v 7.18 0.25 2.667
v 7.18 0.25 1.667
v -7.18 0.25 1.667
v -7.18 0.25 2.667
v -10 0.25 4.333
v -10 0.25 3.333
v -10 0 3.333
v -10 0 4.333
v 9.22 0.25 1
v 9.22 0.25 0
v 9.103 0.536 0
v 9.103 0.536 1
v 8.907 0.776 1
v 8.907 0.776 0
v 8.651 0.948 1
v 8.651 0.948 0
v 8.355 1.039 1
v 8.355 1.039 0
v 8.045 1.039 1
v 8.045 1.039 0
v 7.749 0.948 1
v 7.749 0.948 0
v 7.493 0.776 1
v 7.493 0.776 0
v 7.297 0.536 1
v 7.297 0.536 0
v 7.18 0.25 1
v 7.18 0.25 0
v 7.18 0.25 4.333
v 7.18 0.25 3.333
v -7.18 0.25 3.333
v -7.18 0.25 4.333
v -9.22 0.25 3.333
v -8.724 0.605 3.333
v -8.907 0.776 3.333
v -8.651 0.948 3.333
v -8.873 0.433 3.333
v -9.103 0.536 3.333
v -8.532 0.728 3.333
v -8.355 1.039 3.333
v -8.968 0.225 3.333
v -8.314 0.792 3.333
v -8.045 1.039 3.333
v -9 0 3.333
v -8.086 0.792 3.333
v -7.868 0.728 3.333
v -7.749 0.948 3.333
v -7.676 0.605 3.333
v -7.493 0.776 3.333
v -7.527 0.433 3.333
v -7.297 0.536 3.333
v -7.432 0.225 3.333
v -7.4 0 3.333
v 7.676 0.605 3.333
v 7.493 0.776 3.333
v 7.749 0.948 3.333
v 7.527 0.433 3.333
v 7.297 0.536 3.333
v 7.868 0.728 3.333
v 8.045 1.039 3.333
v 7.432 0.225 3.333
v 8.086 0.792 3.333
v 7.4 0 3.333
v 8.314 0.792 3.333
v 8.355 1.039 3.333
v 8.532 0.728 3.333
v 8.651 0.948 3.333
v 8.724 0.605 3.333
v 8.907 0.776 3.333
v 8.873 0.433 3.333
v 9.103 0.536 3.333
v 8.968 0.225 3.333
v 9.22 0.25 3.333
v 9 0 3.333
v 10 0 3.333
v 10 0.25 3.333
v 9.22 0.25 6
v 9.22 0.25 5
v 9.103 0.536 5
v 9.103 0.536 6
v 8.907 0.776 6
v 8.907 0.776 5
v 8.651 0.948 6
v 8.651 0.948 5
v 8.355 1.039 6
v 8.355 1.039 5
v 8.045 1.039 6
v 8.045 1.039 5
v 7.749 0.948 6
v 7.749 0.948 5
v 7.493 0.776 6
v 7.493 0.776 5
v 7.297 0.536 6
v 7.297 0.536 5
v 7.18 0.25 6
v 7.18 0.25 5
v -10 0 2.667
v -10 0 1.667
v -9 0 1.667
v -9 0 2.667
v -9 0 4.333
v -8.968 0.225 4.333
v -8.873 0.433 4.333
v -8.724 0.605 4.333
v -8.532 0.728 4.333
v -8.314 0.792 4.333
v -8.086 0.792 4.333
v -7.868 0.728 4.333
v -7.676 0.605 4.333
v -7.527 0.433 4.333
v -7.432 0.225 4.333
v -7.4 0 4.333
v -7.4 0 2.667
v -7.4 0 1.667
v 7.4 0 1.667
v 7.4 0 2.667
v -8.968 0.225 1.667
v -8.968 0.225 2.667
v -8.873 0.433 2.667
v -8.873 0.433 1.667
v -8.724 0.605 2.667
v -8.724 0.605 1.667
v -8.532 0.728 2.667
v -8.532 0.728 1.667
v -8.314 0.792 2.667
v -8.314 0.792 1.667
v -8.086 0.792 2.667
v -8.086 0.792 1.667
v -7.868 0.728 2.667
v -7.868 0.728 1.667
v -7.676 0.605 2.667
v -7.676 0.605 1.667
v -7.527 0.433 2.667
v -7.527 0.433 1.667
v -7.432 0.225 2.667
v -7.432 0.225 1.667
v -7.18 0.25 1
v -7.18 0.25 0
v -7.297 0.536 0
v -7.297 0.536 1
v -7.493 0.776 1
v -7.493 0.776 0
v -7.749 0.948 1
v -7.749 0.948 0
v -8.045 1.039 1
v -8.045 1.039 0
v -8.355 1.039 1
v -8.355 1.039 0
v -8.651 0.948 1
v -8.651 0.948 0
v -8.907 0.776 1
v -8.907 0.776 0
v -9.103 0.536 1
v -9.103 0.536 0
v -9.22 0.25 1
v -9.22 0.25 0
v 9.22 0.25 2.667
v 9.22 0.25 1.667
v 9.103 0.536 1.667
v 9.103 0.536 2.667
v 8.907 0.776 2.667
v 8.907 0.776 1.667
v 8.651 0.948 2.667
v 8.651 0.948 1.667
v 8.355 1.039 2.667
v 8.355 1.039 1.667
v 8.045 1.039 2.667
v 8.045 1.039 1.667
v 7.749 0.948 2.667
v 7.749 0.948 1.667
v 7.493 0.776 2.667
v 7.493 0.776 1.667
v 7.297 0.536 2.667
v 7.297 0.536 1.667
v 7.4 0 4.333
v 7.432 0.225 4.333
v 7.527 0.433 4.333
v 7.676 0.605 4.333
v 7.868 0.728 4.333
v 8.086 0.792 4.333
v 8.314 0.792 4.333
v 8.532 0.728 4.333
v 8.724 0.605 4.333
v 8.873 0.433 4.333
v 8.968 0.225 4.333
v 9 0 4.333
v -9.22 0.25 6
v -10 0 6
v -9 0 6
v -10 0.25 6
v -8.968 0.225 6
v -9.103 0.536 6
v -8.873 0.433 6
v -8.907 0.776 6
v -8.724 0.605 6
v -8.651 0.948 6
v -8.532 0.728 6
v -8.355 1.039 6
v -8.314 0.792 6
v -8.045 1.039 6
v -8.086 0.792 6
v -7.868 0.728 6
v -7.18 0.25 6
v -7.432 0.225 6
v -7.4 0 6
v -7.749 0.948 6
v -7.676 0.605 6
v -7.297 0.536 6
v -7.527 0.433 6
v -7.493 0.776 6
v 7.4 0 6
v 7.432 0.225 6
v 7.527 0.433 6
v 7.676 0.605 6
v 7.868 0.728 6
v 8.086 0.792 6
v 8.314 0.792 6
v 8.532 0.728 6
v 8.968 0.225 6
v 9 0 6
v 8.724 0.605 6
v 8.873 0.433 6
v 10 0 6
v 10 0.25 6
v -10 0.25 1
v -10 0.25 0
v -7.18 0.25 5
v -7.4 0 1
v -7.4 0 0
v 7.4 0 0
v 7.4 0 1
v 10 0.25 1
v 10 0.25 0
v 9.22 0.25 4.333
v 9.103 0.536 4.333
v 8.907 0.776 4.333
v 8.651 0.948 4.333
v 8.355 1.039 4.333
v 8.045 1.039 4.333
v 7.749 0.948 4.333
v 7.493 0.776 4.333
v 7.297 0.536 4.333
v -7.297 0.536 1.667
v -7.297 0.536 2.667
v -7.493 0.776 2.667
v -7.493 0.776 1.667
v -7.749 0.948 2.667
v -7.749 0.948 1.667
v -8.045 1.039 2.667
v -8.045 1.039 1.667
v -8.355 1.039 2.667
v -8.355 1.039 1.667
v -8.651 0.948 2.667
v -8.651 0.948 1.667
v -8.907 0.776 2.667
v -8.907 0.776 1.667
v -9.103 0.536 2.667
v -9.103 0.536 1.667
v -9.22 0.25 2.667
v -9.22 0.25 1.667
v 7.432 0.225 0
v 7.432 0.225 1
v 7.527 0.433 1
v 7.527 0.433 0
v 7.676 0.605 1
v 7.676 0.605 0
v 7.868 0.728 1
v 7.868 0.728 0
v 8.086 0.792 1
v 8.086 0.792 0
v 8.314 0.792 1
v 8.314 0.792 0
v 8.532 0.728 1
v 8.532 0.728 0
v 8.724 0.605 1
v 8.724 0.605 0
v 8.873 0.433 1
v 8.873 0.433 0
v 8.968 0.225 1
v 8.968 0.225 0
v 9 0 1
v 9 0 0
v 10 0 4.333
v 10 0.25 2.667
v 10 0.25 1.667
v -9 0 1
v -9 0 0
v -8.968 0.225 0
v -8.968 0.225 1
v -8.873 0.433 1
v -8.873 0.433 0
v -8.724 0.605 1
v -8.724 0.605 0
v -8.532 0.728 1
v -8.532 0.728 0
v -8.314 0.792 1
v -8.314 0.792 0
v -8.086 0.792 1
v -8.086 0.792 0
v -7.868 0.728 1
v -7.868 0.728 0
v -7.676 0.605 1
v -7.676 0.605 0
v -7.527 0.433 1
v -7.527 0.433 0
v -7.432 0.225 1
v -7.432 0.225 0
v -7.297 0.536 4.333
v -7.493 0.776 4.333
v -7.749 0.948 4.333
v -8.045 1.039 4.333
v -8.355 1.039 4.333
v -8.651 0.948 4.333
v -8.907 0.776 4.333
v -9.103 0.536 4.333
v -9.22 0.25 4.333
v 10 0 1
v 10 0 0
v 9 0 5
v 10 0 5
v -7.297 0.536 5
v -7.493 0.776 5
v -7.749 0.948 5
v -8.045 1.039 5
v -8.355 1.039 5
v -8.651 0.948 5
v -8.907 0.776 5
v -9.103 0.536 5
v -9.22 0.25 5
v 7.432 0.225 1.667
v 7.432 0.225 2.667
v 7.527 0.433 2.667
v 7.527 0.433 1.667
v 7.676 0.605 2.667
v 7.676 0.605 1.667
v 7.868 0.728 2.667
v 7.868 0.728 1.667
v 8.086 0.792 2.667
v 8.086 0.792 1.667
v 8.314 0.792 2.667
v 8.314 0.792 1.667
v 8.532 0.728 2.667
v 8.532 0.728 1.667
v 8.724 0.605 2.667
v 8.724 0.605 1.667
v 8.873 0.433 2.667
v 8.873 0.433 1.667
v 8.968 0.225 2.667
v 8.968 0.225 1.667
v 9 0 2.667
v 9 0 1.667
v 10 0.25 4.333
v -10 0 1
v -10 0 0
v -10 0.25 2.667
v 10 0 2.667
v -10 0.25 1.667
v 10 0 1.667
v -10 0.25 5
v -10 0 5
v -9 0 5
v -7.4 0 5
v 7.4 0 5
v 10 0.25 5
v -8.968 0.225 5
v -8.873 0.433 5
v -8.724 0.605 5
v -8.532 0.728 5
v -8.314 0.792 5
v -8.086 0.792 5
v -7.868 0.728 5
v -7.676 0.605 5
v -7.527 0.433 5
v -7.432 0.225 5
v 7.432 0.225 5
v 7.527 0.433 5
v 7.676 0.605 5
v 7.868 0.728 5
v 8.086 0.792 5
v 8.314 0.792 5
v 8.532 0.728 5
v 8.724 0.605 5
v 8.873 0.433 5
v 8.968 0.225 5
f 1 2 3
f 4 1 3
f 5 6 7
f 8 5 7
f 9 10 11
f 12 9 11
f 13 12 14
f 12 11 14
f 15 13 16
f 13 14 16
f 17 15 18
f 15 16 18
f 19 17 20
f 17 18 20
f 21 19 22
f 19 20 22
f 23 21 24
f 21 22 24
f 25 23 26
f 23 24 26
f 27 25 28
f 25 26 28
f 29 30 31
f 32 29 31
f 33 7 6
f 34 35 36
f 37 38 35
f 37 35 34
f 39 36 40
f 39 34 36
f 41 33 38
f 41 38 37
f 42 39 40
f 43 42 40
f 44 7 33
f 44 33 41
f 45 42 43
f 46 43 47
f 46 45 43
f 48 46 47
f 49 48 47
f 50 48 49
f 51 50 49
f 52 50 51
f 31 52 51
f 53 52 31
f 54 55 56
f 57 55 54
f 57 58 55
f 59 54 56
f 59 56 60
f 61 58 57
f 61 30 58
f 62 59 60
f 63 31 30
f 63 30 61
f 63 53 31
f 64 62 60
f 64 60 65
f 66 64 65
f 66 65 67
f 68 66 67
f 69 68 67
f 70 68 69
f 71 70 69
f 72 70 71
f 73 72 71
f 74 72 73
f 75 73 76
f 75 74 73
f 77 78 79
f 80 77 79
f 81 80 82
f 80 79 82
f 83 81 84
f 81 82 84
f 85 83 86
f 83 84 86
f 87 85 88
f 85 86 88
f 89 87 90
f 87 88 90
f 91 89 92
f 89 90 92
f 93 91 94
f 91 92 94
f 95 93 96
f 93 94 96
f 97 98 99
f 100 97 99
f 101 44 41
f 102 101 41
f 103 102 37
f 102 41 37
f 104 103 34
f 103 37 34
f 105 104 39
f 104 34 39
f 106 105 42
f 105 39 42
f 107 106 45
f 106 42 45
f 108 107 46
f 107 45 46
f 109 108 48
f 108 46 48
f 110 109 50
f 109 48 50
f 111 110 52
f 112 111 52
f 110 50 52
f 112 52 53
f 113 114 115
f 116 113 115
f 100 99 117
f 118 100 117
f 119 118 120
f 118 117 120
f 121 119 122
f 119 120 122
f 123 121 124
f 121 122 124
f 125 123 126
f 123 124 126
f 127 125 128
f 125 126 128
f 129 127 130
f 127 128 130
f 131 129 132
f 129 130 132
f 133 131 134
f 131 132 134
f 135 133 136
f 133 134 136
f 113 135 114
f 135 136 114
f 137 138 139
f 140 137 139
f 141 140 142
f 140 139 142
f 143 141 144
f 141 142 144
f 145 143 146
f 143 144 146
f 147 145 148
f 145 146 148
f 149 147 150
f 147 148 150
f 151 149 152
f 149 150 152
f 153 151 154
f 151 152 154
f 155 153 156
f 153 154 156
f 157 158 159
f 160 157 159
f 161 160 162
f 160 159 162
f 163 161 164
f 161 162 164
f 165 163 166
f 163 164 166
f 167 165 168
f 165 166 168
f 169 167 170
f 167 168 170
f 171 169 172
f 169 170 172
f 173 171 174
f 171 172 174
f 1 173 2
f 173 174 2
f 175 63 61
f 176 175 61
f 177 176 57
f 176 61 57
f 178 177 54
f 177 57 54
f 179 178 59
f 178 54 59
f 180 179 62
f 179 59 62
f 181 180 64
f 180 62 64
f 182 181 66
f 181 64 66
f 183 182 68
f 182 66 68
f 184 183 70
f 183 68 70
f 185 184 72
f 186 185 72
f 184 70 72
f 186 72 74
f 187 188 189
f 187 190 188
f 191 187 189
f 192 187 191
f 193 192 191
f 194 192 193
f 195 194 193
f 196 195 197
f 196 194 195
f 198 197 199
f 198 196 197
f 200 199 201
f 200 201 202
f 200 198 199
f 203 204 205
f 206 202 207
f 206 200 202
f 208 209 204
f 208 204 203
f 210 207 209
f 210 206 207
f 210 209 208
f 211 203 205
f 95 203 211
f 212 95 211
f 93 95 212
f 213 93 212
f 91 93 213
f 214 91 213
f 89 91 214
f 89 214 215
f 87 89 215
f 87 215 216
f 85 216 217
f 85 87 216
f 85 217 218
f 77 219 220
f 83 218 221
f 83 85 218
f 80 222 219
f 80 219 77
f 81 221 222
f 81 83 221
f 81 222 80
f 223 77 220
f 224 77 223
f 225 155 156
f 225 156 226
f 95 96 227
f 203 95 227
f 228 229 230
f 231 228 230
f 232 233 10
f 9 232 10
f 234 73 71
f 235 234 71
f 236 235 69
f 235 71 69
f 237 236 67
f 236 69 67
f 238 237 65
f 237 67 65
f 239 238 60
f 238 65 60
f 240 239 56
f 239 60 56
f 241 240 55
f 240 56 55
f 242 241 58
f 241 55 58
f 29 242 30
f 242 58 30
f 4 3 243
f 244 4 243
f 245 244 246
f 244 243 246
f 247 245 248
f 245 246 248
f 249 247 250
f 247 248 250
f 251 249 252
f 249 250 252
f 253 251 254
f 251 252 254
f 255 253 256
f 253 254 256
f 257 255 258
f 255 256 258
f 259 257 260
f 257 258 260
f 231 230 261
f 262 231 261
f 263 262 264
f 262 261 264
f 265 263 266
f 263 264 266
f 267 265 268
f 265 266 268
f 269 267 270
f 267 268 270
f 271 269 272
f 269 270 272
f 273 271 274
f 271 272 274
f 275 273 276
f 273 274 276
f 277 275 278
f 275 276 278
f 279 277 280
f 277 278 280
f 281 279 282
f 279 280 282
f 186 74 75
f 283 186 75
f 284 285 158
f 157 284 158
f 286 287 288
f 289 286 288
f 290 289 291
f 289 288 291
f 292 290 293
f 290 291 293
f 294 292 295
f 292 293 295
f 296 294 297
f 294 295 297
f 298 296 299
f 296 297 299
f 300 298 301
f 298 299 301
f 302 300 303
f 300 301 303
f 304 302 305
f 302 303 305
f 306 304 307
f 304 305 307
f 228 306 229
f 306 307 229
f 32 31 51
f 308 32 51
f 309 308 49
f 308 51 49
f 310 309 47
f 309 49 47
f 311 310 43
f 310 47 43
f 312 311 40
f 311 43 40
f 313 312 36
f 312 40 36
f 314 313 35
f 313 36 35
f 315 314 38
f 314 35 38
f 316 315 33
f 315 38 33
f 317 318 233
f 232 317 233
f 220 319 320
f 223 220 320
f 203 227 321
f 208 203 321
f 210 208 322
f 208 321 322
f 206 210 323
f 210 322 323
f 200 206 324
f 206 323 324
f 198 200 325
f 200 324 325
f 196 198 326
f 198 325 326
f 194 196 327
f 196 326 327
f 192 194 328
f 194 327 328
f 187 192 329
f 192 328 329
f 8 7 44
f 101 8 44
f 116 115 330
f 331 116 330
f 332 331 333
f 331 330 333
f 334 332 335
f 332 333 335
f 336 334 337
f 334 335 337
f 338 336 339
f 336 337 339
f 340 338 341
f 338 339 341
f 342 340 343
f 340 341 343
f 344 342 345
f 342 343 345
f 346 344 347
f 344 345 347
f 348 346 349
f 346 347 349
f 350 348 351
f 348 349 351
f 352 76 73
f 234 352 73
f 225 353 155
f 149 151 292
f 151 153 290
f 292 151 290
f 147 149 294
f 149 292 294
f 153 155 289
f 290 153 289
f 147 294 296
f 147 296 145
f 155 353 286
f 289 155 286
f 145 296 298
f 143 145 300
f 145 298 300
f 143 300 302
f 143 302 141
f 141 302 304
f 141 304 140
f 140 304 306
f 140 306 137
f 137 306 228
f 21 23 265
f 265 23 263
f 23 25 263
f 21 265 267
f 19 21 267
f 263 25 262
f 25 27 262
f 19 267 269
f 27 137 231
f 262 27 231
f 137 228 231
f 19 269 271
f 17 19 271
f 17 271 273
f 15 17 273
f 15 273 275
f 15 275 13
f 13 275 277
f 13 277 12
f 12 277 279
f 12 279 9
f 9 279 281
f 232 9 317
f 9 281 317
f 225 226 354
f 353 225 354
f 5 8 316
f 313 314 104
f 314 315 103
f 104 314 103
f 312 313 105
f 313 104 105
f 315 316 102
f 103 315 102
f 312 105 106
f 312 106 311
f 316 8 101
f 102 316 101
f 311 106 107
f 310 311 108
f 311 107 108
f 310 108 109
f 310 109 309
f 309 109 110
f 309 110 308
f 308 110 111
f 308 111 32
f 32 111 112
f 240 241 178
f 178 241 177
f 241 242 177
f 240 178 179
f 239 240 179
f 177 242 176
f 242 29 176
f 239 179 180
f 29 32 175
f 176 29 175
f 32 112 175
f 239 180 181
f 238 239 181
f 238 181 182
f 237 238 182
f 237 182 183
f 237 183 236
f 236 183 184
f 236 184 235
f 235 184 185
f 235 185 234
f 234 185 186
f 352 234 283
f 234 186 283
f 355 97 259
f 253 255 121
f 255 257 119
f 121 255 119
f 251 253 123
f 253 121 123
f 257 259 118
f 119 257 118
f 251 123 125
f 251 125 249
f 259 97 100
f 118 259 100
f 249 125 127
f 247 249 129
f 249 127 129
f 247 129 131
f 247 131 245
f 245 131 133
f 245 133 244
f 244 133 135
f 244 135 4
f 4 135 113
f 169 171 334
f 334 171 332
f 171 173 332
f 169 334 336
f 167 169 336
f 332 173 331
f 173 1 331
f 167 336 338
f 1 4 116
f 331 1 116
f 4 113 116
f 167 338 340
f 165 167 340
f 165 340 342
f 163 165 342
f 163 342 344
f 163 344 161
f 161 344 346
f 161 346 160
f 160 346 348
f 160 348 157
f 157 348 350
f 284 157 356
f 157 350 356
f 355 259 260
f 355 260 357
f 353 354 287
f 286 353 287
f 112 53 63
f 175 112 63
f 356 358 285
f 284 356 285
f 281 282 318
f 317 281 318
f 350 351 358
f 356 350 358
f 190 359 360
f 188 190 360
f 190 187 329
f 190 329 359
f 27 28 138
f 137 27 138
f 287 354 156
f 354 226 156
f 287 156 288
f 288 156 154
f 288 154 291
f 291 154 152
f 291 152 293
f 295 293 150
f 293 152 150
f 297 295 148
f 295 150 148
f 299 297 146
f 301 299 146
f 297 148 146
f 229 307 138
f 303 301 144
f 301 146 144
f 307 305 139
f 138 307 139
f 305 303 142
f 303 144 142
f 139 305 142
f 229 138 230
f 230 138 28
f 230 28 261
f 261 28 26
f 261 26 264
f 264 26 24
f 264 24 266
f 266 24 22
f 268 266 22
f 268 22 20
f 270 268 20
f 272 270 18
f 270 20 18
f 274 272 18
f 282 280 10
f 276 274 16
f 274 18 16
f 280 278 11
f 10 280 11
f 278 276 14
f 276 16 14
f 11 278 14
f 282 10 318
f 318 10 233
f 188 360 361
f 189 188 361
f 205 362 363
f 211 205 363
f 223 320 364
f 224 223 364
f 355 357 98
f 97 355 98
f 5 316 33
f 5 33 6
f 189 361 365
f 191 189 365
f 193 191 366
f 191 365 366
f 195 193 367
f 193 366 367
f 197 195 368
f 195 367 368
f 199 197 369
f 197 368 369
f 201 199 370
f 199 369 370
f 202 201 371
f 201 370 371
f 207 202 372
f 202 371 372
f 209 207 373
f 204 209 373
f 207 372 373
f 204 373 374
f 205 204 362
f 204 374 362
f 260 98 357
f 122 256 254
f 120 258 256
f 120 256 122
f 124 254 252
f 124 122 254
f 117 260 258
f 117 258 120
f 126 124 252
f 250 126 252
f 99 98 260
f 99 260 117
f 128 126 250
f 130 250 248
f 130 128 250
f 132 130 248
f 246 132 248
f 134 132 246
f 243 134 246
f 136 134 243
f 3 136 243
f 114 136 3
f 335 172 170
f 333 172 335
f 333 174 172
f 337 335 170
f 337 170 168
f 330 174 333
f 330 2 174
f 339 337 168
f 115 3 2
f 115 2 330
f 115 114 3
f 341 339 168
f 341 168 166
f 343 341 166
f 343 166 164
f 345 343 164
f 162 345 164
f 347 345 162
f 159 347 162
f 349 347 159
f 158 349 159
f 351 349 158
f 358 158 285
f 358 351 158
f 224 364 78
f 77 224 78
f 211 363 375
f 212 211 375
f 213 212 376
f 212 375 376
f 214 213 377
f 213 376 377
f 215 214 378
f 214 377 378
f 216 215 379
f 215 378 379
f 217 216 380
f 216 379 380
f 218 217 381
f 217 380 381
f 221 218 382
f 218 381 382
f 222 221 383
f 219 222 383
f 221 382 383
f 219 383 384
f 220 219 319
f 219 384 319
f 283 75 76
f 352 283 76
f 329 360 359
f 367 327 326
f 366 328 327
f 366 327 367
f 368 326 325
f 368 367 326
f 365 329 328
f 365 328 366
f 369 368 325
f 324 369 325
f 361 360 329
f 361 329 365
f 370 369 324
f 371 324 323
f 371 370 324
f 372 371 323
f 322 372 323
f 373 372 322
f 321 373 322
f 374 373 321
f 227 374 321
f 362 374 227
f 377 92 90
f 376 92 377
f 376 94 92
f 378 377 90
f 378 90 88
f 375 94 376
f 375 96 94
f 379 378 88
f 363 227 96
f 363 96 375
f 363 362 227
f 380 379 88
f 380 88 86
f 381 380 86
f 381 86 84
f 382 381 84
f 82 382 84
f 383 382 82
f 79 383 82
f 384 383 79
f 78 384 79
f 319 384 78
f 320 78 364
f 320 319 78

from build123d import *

# Parameters (mm, degrees)
EXTRUDE_THIN1_DEPTH = 6
SKETCH2_W           = 20
SKETCH2_H           = 0.666666
EXTRUDE1_DEPTH      = 2.05


with BuildPart() as part:
    # Sketch1 → Extrude-Thin1 (new body)
    with BuildSketch(Plane.XY):
        with BuildLine():
            Line((-10, 0), (-9, 0))
            ThreePointArc((-9, 0), (-8.2, 0.8), (-7.4, 0))
            Line((-7.4, 0), (7.4, 0))
            ThreePointArc((7.4, 0), (8.2, 0.8), (9, 0))
            Line((9, 0), (10, 0))
            Line((10, 0), (10, 0.25))
            Line((10, 0.25), (9.219803903, 0.25))
            ThreePointArc((9.219803903, 0.25), (8.2, 1.05), (7.180196097, 0.25))
            Line((7.180196097, 0.25), (-7.180196097, 0.25))
            ThreePointArc((-7.180196097, 0.25), (-8.2, 1.05), (-9.219803903, 0.25))
            Line((-9.219803903, 0.25), (-10, 0.25))
            Line((-10, 0.25), (-10, 0))
        make_face()
    extrude(amount=EXTRUDE_THIN1_DEPTH)

    # Sketch2 → Extrude1 (cut, through all)
    with BuildSketch(Plane(origin=(0, 0, 0), x_dir=(1, 0, 0), z_dir=(0, 1, 0))):
        with Locations((0, -1.333333)):
            Rectangle(SKETCH2_W, SKETCH2_H)
        with Locations((0, -2.999999)):
            Rectangle(SKETCH2_W, SKETCH2_H)
        with Locations((0, -4.666665)):
            Rectangle(SKETCH2_W, SKETCH2_H)
    extrude(amount=EXTRUDE1_DEPTH, mode=Mode.SUBTRACT)


solid = part.part
